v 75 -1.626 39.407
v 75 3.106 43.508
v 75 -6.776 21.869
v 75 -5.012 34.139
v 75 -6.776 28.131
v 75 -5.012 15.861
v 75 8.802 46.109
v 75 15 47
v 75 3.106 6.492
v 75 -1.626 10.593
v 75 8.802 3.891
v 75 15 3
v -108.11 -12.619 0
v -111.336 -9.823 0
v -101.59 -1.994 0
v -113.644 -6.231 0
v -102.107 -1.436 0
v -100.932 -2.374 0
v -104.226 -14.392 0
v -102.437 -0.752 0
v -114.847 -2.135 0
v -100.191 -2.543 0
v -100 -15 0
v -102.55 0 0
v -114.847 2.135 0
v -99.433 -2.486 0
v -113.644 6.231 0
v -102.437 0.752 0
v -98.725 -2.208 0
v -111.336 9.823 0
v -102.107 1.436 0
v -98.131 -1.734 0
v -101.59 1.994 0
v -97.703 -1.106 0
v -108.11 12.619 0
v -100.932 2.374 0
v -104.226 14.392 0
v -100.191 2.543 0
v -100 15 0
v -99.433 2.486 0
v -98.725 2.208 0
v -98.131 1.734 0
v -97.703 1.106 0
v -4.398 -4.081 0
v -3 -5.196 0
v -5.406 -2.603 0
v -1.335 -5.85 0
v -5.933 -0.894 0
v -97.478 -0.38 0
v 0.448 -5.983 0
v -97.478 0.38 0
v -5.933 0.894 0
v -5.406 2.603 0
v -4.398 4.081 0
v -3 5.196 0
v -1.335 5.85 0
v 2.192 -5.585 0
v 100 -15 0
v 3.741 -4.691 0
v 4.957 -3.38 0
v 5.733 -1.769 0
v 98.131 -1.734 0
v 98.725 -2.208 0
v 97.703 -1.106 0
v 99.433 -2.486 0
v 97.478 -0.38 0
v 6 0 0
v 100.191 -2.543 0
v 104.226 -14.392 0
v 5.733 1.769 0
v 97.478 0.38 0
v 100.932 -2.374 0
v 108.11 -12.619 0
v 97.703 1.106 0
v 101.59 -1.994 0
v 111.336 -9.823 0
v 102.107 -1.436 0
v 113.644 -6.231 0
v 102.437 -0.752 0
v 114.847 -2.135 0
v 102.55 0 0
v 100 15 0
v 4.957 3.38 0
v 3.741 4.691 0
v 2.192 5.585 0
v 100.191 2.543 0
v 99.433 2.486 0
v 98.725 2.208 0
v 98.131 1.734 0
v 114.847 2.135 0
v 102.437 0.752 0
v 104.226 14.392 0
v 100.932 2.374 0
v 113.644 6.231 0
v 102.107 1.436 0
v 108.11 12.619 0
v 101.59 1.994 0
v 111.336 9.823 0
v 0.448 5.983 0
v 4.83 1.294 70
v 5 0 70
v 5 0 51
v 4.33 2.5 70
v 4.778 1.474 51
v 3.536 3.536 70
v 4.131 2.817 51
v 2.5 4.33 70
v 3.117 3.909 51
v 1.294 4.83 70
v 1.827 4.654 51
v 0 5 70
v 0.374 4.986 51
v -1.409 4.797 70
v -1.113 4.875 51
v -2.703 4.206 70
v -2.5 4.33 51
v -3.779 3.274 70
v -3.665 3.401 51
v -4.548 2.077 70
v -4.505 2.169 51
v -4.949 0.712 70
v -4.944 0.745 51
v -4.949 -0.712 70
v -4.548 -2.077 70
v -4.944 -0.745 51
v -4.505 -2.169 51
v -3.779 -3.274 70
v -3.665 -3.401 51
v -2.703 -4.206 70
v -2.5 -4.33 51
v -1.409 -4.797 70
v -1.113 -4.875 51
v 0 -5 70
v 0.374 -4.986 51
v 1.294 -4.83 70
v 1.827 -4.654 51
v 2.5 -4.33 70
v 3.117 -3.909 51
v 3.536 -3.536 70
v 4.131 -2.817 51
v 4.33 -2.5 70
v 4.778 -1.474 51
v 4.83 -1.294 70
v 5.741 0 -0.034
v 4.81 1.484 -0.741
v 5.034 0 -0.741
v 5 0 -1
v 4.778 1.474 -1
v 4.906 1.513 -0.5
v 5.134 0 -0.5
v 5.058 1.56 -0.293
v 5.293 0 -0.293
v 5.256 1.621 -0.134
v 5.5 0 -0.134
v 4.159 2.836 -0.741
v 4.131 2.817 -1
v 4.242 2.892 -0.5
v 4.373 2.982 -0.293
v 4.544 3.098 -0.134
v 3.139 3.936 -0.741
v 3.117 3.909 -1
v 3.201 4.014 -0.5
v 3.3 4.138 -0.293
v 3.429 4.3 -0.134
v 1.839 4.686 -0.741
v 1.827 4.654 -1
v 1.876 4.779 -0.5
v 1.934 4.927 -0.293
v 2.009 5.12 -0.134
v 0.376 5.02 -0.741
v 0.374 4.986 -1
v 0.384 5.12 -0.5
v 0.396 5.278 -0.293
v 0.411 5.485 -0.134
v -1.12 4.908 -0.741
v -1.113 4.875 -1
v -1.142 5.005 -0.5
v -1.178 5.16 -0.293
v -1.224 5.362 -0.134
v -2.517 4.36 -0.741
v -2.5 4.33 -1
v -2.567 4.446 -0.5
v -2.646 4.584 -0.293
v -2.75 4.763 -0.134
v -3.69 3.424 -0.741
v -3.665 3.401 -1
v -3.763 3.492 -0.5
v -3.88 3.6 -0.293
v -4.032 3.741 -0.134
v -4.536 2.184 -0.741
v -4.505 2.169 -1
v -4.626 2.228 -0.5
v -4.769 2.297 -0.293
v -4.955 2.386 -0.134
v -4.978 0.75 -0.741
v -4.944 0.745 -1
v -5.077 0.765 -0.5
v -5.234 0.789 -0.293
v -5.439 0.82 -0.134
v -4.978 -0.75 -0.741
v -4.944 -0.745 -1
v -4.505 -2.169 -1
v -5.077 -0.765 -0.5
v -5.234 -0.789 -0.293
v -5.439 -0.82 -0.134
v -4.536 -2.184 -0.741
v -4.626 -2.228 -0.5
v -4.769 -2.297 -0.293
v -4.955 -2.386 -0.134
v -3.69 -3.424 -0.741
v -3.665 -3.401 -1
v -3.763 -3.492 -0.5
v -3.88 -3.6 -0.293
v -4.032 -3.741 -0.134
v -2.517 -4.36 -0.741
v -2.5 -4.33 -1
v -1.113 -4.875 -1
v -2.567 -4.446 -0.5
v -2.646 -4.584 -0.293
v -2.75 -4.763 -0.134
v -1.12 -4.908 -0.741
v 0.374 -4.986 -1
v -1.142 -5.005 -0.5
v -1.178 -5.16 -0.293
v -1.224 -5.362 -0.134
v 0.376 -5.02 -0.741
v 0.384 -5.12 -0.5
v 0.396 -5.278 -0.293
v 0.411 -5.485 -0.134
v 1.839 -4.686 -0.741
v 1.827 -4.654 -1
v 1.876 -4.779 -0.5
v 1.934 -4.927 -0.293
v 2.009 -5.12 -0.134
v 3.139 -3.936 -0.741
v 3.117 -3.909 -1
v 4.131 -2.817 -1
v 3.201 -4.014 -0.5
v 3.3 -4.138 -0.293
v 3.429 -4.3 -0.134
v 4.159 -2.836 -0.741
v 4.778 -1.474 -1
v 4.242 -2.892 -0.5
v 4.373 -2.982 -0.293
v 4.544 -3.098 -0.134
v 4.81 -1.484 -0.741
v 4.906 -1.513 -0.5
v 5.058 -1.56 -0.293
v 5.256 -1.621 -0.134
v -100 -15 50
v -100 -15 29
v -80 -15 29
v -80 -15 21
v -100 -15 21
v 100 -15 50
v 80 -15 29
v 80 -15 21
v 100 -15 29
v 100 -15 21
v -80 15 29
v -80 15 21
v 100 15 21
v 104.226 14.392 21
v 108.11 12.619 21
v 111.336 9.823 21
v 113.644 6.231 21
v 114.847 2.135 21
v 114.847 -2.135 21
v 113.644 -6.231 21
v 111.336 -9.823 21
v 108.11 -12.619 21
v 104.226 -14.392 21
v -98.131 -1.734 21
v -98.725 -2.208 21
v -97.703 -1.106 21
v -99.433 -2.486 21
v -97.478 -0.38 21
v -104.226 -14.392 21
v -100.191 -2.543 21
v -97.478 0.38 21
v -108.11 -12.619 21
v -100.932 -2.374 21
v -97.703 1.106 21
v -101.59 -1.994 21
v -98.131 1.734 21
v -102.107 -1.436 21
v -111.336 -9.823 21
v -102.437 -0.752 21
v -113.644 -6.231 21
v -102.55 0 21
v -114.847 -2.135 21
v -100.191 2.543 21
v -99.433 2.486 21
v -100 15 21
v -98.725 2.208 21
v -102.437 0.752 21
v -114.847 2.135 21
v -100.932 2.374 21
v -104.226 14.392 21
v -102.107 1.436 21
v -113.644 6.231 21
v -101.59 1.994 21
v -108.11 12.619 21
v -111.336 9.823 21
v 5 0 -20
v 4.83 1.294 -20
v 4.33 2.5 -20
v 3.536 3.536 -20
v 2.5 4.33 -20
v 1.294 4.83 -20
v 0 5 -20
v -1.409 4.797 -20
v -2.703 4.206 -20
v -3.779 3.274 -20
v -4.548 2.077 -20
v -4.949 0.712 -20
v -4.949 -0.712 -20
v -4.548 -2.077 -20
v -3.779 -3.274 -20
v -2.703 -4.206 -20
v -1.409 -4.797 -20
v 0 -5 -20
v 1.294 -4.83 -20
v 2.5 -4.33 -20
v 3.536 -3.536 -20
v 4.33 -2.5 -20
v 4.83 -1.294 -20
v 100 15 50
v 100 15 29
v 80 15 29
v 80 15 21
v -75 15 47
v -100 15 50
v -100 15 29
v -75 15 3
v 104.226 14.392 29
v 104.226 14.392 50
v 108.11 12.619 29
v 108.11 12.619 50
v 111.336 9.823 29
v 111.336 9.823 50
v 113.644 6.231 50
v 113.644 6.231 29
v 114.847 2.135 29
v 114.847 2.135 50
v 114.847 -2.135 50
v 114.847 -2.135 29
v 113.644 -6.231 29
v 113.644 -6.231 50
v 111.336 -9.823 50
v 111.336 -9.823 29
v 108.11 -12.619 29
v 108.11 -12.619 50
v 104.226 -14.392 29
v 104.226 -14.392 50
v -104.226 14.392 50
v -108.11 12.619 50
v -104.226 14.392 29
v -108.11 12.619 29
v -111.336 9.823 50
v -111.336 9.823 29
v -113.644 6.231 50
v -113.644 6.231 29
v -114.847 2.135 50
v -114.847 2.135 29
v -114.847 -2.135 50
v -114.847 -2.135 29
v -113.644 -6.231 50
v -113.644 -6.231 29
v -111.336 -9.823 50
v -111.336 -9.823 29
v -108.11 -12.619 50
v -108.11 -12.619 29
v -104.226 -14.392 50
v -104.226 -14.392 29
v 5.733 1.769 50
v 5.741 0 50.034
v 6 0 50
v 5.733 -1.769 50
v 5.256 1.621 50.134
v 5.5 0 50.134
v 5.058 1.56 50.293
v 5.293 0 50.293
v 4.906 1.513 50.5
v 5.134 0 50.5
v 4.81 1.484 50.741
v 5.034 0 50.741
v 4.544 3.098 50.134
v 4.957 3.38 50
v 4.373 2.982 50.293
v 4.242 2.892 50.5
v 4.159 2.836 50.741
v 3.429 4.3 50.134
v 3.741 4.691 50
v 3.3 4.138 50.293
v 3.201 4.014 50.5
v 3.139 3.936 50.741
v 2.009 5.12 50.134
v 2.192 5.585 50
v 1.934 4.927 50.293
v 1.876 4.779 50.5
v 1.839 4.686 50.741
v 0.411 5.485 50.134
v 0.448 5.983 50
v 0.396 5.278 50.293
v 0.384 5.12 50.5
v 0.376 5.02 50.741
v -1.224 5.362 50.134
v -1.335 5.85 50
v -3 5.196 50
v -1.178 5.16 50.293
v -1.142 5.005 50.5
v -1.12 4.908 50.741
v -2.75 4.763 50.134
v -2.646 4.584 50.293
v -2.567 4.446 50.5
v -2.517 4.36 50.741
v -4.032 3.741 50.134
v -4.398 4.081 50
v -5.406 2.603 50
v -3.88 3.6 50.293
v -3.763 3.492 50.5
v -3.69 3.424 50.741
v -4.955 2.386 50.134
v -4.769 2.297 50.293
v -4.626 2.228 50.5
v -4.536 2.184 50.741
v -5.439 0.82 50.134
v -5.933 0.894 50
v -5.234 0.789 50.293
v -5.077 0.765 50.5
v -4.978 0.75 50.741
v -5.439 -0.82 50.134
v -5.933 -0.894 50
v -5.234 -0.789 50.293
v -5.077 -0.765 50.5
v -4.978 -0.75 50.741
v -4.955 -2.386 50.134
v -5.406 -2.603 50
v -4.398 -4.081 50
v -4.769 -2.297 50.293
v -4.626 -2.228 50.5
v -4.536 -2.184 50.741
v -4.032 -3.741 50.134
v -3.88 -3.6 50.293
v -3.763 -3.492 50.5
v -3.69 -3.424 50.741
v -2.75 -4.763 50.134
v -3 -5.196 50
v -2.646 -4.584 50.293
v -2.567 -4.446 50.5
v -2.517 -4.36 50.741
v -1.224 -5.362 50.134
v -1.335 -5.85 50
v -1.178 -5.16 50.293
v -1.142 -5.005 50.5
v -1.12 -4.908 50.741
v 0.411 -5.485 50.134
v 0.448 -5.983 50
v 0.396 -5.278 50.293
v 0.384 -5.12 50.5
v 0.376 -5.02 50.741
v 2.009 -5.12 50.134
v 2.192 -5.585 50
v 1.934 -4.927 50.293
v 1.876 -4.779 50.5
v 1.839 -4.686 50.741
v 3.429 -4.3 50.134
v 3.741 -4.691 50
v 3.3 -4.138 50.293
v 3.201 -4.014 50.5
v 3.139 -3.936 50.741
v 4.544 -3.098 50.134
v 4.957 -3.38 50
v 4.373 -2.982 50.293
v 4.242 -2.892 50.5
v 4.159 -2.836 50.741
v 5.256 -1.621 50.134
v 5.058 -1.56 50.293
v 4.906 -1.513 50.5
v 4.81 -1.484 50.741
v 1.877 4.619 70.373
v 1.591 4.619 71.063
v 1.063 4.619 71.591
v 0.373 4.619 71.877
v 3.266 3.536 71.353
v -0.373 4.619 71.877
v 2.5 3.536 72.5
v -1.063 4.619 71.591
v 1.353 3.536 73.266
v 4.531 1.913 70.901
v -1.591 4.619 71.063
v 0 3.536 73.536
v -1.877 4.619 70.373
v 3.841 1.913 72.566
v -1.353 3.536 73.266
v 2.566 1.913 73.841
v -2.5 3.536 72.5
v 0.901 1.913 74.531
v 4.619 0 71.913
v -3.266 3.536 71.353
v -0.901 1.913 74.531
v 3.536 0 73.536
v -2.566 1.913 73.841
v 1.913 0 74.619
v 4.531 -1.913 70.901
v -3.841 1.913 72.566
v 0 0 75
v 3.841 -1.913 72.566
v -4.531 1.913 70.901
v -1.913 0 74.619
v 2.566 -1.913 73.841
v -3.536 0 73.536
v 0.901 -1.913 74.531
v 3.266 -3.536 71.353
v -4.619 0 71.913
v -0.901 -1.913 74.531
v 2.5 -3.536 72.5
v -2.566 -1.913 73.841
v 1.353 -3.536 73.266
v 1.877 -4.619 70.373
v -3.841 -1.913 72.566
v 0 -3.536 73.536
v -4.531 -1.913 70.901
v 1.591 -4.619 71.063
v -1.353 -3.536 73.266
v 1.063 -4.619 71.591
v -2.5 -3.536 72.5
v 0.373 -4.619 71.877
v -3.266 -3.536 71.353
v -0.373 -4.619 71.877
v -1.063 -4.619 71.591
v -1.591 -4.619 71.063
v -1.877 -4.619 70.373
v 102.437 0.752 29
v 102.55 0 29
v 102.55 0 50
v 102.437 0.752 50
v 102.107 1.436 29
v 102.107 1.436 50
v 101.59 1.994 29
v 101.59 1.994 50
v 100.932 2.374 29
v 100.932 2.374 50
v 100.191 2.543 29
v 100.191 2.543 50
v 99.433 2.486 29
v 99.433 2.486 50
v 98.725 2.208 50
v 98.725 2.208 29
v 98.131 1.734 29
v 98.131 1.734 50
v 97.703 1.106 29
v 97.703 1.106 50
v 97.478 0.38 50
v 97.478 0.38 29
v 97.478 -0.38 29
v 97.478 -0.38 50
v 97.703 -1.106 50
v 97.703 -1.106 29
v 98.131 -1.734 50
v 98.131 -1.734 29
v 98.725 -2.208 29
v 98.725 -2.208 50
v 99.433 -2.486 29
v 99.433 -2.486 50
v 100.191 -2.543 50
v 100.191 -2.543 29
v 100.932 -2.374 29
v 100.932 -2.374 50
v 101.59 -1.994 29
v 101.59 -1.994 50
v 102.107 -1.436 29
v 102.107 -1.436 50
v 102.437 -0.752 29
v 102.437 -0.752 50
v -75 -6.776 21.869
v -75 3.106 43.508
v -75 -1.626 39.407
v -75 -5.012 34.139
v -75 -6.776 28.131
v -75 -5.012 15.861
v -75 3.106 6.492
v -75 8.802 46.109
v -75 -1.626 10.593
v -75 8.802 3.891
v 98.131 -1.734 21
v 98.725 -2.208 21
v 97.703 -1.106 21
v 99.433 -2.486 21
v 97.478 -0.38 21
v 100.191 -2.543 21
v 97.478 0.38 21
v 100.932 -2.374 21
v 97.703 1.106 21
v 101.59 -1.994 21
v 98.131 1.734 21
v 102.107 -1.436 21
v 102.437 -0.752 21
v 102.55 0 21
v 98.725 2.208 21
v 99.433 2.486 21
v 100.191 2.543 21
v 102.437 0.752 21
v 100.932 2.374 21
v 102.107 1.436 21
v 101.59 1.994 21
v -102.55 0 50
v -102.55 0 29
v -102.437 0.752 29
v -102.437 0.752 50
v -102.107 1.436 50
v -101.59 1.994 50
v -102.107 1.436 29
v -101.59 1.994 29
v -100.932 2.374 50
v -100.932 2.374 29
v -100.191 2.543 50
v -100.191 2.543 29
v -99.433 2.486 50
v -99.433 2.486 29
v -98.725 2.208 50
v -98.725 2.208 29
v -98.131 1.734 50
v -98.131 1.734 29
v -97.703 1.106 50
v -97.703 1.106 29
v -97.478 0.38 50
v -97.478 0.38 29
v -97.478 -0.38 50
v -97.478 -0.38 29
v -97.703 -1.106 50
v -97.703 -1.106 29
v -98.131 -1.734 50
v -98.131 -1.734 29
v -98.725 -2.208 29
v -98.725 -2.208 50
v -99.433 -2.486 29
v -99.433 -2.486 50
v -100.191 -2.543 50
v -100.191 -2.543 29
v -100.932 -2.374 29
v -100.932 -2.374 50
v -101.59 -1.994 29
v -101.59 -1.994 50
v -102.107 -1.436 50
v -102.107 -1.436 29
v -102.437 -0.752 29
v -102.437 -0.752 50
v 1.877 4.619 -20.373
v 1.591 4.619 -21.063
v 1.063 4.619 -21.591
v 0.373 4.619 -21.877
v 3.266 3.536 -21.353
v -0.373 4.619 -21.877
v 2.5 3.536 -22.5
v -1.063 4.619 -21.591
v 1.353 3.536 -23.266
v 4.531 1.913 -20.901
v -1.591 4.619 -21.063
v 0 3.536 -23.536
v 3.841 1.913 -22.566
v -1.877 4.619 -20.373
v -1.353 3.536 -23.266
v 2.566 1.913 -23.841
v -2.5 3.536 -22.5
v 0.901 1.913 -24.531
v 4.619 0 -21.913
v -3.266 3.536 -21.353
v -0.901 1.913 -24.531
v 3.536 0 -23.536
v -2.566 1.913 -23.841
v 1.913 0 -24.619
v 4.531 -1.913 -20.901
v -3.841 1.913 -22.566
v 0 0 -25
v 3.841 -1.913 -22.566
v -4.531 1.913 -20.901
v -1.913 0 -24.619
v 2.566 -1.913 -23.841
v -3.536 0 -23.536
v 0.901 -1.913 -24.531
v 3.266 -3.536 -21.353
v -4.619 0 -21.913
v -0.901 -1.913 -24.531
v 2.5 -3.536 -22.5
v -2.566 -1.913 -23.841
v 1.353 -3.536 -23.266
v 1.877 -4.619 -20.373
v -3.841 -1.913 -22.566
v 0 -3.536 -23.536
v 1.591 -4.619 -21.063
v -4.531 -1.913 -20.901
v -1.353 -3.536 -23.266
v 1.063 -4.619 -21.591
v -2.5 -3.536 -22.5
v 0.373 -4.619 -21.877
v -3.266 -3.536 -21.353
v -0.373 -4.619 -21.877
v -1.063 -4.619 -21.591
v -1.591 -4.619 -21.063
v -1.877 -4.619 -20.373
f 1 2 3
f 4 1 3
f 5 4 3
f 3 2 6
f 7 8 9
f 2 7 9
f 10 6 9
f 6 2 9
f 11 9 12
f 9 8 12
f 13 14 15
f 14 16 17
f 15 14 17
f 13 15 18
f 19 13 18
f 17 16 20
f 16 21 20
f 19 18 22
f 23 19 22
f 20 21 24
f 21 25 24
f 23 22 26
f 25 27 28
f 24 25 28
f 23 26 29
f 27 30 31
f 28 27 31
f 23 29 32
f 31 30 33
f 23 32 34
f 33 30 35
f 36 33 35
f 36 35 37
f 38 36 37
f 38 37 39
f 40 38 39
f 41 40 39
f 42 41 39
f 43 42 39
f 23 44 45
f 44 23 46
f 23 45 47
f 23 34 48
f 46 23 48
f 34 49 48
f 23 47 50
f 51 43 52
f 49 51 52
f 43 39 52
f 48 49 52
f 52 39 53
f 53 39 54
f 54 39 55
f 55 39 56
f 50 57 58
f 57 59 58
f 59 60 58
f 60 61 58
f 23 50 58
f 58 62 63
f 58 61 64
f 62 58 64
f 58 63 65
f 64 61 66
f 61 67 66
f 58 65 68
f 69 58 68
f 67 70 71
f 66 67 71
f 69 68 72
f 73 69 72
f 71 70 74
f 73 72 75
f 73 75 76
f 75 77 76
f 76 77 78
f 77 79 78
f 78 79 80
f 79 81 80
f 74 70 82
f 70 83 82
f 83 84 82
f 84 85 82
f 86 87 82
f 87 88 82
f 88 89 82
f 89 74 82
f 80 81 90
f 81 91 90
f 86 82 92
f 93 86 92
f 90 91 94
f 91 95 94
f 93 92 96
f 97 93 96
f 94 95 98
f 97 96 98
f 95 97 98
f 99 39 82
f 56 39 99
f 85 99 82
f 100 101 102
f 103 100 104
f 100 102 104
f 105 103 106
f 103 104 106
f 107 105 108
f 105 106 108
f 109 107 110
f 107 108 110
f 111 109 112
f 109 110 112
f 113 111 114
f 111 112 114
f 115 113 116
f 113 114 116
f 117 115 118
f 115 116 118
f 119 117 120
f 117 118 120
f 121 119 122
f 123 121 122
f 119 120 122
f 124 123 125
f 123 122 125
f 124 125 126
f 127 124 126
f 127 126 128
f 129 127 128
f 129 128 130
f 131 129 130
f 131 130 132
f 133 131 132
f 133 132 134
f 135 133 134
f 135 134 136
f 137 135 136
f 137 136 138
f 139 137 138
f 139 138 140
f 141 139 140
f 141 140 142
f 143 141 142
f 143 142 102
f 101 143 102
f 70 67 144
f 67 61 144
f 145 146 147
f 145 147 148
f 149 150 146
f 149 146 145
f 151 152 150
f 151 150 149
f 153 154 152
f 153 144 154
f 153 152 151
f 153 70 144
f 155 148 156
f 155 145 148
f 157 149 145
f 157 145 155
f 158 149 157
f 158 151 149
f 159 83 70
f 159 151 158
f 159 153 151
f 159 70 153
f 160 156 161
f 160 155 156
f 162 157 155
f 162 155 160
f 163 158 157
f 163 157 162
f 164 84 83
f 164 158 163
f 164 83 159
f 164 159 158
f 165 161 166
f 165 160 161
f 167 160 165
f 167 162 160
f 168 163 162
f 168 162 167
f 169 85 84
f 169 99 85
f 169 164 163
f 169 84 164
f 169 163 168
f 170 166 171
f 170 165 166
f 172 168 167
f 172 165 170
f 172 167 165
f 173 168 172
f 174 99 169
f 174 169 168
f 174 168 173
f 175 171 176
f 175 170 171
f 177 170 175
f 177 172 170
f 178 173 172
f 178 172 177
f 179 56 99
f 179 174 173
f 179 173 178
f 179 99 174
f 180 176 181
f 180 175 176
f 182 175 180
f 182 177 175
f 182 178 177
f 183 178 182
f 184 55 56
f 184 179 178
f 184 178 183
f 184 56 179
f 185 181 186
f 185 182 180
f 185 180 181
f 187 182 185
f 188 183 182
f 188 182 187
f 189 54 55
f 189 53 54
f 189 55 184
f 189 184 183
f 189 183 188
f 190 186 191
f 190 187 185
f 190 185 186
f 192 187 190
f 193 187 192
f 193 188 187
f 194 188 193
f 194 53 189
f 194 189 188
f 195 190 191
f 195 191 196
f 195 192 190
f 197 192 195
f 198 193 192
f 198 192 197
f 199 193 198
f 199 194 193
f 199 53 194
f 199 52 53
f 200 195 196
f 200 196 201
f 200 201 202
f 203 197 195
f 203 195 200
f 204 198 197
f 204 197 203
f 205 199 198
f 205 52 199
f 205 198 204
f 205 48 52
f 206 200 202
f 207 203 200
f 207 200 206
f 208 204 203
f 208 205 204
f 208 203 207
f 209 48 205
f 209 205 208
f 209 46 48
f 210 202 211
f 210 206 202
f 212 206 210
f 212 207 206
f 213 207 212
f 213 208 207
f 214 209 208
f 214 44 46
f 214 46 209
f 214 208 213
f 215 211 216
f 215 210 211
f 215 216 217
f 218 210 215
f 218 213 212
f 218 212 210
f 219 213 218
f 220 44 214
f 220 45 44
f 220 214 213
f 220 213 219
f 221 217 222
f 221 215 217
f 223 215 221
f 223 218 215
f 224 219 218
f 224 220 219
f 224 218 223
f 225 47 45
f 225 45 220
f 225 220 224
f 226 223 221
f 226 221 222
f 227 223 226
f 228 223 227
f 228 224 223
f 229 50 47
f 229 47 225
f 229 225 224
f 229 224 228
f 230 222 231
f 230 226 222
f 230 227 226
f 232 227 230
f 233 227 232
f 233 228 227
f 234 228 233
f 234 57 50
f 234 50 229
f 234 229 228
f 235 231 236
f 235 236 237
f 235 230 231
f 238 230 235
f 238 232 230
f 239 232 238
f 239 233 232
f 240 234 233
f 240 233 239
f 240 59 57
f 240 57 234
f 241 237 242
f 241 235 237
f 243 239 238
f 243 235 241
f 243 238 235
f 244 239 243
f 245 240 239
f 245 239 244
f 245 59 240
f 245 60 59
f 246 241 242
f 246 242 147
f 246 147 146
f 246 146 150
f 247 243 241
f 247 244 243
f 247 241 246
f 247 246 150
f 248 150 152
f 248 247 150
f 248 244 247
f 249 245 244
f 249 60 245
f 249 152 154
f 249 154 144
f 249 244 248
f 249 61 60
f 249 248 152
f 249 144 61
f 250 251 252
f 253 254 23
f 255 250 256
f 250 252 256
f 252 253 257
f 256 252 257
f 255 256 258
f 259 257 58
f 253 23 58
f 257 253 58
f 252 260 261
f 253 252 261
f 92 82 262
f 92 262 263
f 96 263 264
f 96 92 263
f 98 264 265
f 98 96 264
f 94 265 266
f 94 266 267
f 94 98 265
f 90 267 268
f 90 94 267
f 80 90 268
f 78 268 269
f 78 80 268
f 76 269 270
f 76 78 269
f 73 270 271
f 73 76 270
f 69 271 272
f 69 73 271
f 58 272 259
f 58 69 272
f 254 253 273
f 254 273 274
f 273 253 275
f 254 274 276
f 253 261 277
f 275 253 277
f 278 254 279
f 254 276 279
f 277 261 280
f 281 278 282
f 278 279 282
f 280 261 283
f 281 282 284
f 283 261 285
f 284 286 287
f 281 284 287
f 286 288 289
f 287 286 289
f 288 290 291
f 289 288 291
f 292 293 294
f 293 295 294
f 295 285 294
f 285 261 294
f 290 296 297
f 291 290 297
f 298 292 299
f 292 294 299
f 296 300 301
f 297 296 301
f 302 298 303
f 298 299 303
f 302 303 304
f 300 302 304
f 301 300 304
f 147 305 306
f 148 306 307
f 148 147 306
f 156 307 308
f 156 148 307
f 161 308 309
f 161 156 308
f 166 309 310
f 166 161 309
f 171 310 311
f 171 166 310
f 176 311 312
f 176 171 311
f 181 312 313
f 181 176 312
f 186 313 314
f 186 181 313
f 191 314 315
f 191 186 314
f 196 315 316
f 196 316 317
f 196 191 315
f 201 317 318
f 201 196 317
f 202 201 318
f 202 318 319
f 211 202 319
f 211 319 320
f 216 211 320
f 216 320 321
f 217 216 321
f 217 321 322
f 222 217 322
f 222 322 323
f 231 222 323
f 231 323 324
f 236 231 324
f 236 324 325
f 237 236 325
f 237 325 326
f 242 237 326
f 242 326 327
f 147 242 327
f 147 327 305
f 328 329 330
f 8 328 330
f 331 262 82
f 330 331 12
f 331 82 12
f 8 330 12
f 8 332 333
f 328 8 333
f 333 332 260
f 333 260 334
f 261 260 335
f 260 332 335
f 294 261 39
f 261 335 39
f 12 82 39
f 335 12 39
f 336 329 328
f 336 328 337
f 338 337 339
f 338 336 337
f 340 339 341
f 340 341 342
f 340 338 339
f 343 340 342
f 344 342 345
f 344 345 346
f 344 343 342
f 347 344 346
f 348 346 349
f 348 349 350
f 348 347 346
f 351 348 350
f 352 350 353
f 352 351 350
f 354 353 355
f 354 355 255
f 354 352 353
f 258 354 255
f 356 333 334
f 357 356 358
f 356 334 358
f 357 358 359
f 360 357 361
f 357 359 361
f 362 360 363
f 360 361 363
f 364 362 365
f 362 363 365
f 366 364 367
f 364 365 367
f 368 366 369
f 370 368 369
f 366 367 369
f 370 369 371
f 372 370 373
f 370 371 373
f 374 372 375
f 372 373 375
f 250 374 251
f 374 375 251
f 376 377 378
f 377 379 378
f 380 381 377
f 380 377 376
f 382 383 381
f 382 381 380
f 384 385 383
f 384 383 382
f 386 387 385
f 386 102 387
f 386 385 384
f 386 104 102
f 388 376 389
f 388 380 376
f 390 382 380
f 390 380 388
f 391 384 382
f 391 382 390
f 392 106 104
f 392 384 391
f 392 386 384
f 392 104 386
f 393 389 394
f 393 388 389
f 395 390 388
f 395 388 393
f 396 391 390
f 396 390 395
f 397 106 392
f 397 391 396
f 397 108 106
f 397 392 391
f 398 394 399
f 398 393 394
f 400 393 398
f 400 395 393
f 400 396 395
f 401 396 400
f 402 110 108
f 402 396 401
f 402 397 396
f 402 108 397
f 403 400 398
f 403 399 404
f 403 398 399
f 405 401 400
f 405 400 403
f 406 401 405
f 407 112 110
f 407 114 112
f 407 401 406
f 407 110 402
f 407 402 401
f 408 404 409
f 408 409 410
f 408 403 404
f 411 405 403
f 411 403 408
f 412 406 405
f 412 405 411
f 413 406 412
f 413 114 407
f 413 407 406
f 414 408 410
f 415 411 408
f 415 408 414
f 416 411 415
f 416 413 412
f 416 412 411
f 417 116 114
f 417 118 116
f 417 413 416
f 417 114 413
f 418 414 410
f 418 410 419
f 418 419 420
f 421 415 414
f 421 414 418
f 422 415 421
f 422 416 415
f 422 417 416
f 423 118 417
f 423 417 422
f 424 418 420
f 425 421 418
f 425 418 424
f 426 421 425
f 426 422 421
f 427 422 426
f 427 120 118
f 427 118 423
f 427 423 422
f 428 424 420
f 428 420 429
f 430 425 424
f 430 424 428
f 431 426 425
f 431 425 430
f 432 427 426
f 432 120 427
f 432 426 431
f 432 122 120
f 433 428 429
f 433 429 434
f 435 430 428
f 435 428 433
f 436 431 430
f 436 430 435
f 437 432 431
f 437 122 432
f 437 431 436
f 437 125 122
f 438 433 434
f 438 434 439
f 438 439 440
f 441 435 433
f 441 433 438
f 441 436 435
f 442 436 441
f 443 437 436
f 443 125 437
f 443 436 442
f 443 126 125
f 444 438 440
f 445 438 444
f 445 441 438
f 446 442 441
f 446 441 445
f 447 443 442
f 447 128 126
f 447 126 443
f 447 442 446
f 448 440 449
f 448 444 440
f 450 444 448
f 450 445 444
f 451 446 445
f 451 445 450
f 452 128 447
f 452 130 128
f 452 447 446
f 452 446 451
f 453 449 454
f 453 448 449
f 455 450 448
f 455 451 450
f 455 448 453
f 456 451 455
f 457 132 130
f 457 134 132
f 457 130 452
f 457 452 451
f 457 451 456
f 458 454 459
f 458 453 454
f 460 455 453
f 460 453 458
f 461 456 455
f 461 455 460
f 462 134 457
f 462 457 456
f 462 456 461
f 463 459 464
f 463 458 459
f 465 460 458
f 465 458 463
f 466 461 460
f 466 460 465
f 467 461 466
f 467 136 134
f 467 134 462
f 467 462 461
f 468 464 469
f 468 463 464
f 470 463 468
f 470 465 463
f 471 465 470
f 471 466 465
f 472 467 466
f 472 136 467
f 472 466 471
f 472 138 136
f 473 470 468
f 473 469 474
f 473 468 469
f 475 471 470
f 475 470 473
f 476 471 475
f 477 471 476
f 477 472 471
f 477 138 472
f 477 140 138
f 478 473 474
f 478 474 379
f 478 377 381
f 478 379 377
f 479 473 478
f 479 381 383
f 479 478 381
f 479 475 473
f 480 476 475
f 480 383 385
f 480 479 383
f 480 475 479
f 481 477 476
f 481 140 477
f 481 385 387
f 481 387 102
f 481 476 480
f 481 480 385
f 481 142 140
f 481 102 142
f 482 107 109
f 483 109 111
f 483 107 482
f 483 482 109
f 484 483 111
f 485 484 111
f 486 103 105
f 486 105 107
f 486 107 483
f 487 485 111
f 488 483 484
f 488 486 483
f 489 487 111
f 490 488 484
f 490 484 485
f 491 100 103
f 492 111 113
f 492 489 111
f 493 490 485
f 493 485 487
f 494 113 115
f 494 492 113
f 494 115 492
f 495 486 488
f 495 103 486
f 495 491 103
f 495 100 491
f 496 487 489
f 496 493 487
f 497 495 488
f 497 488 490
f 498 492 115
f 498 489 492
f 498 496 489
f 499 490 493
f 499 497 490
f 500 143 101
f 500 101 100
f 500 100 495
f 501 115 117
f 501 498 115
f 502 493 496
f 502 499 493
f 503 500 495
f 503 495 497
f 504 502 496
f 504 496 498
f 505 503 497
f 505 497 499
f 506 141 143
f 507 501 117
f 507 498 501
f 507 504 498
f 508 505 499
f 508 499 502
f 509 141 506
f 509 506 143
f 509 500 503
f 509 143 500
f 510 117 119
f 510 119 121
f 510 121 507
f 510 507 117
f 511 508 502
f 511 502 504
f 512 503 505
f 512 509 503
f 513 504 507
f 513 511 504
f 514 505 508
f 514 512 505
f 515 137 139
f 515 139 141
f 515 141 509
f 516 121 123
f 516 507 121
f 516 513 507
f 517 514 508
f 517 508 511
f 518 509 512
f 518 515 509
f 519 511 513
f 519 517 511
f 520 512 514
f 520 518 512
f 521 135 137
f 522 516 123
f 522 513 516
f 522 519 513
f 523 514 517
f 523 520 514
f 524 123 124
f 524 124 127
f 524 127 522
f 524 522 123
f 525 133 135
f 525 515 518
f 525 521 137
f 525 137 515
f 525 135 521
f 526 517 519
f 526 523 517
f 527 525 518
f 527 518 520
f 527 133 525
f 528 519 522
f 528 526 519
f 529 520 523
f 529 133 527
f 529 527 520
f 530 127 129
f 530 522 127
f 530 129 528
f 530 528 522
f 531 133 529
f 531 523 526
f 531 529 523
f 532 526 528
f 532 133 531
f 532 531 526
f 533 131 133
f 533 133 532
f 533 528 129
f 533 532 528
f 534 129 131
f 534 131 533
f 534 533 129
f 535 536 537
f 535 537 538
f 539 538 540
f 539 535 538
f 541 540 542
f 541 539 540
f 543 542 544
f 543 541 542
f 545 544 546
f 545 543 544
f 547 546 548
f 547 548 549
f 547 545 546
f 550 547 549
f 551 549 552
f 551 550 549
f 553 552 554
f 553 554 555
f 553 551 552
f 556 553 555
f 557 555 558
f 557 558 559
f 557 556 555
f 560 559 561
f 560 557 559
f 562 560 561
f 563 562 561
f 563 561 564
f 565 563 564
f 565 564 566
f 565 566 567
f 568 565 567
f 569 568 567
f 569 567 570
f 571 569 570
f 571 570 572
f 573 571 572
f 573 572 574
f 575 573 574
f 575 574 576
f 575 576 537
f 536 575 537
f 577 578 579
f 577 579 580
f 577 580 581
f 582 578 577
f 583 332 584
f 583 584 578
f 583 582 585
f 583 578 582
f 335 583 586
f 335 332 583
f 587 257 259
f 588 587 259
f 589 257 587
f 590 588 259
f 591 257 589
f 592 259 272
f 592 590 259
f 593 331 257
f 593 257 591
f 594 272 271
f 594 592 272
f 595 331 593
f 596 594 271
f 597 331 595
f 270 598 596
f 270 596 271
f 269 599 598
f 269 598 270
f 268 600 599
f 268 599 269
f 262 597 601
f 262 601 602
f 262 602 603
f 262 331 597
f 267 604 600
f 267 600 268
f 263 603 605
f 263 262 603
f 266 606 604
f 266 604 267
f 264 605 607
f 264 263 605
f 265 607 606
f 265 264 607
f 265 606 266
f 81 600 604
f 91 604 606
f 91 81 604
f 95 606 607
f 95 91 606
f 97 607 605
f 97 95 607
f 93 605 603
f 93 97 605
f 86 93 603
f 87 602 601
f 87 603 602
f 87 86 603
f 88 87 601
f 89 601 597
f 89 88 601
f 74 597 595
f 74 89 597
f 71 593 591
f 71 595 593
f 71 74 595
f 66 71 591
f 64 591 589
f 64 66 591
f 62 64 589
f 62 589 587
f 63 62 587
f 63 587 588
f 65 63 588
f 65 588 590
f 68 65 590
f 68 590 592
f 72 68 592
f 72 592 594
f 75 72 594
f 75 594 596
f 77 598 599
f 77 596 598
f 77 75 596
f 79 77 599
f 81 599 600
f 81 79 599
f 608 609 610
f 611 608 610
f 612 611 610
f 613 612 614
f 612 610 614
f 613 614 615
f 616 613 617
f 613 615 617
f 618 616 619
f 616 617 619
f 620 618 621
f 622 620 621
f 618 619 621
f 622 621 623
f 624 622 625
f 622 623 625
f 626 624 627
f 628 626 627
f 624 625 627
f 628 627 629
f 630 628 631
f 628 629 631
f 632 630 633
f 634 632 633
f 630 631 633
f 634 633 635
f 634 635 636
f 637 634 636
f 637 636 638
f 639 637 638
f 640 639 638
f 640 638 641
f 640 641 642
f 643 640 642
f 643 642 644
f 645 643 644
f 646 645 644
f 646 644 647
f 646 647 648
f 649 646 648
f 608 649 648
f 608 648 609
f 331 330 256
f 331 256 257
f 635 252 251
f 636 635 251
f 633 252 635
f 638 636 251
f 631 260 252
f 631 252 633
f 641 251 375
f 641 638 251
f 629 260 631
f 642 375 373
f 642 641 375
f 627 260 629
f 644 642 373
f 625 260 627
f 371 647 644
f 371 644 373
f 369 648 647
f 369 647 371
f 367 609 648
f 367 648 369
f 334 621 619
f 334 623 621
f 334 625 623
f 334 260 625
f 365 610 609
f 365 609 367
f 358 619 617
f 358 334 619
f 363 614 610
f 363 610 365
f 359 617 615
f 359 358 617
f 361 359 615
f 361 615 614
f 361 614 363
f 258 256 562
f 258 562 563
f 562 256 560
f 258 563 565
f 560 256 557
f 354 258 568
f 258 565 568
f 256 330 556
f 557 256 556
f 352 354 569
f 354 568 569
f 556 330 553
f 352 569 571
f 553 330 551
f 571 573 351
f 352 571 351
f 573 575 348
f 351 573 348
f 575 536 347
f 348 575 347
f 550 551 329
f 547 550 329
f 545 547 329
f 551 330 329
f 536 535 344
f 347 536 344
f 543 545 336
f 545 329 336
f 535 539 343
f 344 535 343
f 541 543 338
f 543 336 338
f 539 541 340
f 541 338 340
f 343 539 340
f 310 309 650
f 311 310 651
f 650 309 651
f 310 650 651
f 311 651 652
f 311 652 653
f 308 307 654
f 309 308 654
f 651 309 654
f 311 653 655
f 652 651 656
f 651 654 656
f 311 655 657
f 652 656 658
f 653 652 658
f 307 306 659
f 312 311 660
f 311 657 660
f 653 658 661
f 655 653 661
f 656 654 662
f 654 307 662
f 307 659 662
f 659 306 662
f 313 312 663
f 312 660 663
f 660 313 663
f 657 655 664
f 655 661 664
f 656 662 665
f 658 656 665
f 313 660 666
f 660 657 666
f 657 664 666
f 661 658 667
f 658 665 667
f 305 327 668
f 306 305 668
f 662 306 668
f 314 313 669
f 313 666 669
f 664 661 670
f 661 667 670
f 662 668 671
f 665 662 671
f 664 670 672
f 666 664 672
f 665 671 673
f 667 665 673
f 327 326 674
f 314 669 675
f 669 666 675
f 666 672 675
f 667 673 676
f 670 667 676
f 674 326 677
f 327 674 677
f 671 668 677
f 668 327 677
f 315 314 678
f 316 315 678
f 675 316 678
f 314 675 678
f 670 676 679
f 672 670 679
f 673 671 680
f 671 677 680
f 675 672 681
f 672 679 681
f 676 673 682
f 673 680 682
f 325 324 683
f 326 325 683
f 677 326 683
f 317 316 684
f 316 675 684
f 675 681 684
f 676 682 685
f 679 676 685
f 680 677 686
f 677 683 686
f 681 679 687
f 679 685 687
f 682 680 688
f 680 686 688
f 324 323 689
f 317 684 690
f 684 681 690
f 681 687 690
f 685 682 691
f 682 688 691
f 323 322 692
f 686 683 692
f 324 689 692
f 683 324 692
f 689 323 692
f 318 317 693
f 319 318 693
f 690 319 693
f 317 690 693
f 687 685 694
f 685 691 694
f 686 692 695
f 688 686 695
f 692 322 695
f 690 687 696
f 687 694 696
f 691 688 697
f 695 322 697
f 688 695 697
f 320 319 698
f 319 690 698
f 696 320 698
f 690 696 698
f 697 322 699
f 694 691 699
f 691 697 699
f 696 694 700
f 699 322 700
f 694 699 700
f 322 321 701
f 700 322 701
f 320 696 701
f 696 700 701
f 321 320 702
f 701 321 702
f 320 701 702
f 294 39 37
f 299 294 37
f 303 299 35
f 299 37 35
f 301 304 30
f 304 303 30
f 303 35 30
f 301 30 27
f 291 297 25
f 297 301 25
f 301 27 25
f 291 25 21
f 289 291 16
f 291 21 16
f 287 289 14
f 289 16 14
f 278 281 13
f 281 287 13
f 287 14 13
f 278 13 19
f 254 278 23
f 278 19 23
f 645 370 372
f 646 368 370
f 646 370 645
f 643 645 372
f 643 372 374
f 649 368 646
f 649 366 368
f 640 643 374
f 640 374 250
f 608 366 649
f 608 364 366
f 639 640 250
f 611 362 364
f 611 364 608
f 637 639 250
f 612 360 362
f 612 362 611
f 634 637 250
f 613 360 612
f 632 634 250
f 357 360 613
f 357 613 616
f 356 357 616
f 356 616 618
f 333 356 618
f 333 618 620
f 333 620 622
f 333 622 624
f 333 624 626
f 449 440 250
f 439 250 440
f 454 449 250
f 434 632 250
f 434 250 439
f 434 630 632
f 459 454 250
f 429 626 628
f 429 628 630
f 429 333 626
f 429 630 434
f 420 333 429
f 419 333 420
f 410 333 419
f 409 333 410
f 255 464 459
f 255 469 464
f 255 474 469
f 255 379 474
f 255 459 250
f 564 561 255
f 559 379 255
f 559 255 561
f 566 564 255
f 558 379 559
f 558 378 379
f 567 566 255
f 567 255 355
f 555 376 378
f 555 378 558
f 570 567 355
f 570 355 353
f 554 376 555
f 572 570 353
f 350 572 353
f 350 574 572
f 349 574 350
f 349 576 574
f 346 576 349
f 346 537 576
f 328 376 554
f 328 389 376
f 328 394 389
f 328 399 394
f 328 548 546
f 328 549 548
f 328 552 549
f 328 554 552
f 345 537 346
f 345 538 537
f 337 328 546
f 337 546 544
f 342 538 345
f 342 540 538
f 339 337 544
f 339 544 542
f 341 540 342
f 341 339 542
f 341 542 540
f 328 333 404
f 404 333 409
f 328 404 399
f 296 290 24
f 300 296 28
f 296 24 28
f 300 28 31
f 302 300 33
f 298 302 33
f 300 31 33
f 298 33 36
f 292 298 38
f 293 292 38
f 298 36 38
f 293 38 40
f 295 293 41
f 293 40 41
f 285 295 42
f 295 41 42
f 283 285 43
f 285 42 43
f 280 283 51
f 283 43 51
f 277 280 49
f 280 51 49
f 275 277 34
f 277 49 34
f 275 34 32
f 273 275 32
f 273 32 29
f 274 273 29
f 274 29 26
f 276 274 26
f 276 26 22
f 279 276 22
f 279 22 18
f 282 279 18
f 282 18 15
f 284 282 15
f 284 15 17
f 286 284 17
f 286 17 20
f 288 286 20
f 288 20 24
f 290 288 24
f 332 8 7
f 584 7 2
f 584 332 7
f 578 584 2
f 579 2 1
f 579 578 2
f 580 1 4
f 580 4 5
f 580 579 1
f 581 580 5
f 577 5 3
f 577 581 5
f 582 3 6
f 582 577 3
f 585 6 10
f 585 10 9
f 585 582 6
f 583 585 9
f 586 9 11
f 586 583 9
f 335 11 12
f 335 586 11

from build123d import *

# Parameters (mm, degrees)
SKETCH2_R           = 2.55
BOSS_EXTRUDE1_DEPTH = 50
SKETCH6_W           = 35
SKETCH6_H           = 8
CUT_EXTRUDE3_DEPTH  = 31
CUT_EXTRUDE6_DEPTH  = 75
SKETCH9_R           = 5
BOSS_EXTRUDE2_DEPTH = 20
REVOLVE1_ANGLE      = 180
FILLET2_R           = 1


with BuildPart() as part:
    # Sketch2 → Boss-Extrude1 (new body)
    with BuildSketch(Plane.XY):
        with BuildLine():
            Line((0, 15), (100, 15))
            ThreePointArc((100, 15), (115, 0), (100, -15))
            Line((100, -15), (0, -15))
            Line((0, -15), (0, 15))
        make_face()
        with Locations((100, 0)):
            Circle(SKETCH2_R, mode=Mode.SUBTRACT)
    boss_extrude1 = extrude(amount=BOSS_EXTRUDE1_DEPTH)

    # Sketch6 → Cut-Extrude3 (cut, through all)
    with BuildSketch(Plane(origin=(0, 15, 0), x_dir=(1, 0, 0), z_dir=(0, 1, 0))):
        with Locations((97.5, -25)):
            Rectangle(SKETCH6_W, SKETCH6_H)
    cut_extrude3 = extrude(amount=-CUT_EXTRUDE3_DEPTH, mode=Mode.SUBTRACT)

    # Sketch7 → Cut-Extrude6 (cut)
    with BuildSketch(Plane.ZY):
        with BuildLine():
            Line((3, 15), (47, 15))
            ThreePointArc((47, 15), (25, -7), (3, 15))
        make_face()
    cut_extrude6 = extrude(amount=-CUT_EXTRUDE6_DEPTH, mode=Mode.SUBTRACT)

    # Mirror3: Boss-Extrude1, Cut-Extrude3, Cut-Extrude6 across plane
    add(boss_extrude1.mirror(Plane(origin=(0, -15, 50), x_dir=(0, 0, 1), z_dir=(-1, 0, 0))))
    add(cut_extrude3.mirror(Plane(origin=(0, -15, 50), x_dir=(0, 0, 1), z_dir=(-1, 0, 0))), mode=Mode.SUBTRACT)
    add(cut_extrude6.mirror(Plane(origin=(0, -15, 50), x_dir=(0, 0, 1), z_dir=(-1, 0, 0))), mode=Mode.SUBTRACT)

    # Sketch9 → Boss-Extrude2 (add)
    with BuildSketch(Plane.XY.offset(50)):
        Circle(SKETCH9_R)
    boss_extrude2 = extrude(amount=BOSS_EXTRUDE2_DEPTH)

    # Sketch12 → Revolve1 (revolve)
    with BuildSketch(Plane.XY.offset(70)):
        with BuildLine():
            Line((0, -5), (0, 5))
            ThreePointArc((0, 5), (5, 0), (0, -5))
        make_face()
    revolve1 = revolve(axis=Axis((0, -5, 70), (0, -1, 0)), revolution_arc=REVOLVE1_ANGLE)

    # Mirror4: Boss-Extrude2, Revolve1 across plane
    add(boss_extrude2.mirror(Plane(origin=(75, -7, 25), x_dir=(1, 0, 0), z_dir=(0, 0, 1))))
    add(revolve1.mirror(Plane(origin=(75, -7, 25), x_dir=(1, 0, 0), z_dir=(0, 0, 1))))

    # Fillet2
    fillet2_edges = [part.edges().sort_by_distance(p)[0] for p in [
        (-5, 0, 50),
        (-5, 0, 0),
    ]]
    fillet(fillet2_edges, radius=FILLET2_R)


solid = part.part
